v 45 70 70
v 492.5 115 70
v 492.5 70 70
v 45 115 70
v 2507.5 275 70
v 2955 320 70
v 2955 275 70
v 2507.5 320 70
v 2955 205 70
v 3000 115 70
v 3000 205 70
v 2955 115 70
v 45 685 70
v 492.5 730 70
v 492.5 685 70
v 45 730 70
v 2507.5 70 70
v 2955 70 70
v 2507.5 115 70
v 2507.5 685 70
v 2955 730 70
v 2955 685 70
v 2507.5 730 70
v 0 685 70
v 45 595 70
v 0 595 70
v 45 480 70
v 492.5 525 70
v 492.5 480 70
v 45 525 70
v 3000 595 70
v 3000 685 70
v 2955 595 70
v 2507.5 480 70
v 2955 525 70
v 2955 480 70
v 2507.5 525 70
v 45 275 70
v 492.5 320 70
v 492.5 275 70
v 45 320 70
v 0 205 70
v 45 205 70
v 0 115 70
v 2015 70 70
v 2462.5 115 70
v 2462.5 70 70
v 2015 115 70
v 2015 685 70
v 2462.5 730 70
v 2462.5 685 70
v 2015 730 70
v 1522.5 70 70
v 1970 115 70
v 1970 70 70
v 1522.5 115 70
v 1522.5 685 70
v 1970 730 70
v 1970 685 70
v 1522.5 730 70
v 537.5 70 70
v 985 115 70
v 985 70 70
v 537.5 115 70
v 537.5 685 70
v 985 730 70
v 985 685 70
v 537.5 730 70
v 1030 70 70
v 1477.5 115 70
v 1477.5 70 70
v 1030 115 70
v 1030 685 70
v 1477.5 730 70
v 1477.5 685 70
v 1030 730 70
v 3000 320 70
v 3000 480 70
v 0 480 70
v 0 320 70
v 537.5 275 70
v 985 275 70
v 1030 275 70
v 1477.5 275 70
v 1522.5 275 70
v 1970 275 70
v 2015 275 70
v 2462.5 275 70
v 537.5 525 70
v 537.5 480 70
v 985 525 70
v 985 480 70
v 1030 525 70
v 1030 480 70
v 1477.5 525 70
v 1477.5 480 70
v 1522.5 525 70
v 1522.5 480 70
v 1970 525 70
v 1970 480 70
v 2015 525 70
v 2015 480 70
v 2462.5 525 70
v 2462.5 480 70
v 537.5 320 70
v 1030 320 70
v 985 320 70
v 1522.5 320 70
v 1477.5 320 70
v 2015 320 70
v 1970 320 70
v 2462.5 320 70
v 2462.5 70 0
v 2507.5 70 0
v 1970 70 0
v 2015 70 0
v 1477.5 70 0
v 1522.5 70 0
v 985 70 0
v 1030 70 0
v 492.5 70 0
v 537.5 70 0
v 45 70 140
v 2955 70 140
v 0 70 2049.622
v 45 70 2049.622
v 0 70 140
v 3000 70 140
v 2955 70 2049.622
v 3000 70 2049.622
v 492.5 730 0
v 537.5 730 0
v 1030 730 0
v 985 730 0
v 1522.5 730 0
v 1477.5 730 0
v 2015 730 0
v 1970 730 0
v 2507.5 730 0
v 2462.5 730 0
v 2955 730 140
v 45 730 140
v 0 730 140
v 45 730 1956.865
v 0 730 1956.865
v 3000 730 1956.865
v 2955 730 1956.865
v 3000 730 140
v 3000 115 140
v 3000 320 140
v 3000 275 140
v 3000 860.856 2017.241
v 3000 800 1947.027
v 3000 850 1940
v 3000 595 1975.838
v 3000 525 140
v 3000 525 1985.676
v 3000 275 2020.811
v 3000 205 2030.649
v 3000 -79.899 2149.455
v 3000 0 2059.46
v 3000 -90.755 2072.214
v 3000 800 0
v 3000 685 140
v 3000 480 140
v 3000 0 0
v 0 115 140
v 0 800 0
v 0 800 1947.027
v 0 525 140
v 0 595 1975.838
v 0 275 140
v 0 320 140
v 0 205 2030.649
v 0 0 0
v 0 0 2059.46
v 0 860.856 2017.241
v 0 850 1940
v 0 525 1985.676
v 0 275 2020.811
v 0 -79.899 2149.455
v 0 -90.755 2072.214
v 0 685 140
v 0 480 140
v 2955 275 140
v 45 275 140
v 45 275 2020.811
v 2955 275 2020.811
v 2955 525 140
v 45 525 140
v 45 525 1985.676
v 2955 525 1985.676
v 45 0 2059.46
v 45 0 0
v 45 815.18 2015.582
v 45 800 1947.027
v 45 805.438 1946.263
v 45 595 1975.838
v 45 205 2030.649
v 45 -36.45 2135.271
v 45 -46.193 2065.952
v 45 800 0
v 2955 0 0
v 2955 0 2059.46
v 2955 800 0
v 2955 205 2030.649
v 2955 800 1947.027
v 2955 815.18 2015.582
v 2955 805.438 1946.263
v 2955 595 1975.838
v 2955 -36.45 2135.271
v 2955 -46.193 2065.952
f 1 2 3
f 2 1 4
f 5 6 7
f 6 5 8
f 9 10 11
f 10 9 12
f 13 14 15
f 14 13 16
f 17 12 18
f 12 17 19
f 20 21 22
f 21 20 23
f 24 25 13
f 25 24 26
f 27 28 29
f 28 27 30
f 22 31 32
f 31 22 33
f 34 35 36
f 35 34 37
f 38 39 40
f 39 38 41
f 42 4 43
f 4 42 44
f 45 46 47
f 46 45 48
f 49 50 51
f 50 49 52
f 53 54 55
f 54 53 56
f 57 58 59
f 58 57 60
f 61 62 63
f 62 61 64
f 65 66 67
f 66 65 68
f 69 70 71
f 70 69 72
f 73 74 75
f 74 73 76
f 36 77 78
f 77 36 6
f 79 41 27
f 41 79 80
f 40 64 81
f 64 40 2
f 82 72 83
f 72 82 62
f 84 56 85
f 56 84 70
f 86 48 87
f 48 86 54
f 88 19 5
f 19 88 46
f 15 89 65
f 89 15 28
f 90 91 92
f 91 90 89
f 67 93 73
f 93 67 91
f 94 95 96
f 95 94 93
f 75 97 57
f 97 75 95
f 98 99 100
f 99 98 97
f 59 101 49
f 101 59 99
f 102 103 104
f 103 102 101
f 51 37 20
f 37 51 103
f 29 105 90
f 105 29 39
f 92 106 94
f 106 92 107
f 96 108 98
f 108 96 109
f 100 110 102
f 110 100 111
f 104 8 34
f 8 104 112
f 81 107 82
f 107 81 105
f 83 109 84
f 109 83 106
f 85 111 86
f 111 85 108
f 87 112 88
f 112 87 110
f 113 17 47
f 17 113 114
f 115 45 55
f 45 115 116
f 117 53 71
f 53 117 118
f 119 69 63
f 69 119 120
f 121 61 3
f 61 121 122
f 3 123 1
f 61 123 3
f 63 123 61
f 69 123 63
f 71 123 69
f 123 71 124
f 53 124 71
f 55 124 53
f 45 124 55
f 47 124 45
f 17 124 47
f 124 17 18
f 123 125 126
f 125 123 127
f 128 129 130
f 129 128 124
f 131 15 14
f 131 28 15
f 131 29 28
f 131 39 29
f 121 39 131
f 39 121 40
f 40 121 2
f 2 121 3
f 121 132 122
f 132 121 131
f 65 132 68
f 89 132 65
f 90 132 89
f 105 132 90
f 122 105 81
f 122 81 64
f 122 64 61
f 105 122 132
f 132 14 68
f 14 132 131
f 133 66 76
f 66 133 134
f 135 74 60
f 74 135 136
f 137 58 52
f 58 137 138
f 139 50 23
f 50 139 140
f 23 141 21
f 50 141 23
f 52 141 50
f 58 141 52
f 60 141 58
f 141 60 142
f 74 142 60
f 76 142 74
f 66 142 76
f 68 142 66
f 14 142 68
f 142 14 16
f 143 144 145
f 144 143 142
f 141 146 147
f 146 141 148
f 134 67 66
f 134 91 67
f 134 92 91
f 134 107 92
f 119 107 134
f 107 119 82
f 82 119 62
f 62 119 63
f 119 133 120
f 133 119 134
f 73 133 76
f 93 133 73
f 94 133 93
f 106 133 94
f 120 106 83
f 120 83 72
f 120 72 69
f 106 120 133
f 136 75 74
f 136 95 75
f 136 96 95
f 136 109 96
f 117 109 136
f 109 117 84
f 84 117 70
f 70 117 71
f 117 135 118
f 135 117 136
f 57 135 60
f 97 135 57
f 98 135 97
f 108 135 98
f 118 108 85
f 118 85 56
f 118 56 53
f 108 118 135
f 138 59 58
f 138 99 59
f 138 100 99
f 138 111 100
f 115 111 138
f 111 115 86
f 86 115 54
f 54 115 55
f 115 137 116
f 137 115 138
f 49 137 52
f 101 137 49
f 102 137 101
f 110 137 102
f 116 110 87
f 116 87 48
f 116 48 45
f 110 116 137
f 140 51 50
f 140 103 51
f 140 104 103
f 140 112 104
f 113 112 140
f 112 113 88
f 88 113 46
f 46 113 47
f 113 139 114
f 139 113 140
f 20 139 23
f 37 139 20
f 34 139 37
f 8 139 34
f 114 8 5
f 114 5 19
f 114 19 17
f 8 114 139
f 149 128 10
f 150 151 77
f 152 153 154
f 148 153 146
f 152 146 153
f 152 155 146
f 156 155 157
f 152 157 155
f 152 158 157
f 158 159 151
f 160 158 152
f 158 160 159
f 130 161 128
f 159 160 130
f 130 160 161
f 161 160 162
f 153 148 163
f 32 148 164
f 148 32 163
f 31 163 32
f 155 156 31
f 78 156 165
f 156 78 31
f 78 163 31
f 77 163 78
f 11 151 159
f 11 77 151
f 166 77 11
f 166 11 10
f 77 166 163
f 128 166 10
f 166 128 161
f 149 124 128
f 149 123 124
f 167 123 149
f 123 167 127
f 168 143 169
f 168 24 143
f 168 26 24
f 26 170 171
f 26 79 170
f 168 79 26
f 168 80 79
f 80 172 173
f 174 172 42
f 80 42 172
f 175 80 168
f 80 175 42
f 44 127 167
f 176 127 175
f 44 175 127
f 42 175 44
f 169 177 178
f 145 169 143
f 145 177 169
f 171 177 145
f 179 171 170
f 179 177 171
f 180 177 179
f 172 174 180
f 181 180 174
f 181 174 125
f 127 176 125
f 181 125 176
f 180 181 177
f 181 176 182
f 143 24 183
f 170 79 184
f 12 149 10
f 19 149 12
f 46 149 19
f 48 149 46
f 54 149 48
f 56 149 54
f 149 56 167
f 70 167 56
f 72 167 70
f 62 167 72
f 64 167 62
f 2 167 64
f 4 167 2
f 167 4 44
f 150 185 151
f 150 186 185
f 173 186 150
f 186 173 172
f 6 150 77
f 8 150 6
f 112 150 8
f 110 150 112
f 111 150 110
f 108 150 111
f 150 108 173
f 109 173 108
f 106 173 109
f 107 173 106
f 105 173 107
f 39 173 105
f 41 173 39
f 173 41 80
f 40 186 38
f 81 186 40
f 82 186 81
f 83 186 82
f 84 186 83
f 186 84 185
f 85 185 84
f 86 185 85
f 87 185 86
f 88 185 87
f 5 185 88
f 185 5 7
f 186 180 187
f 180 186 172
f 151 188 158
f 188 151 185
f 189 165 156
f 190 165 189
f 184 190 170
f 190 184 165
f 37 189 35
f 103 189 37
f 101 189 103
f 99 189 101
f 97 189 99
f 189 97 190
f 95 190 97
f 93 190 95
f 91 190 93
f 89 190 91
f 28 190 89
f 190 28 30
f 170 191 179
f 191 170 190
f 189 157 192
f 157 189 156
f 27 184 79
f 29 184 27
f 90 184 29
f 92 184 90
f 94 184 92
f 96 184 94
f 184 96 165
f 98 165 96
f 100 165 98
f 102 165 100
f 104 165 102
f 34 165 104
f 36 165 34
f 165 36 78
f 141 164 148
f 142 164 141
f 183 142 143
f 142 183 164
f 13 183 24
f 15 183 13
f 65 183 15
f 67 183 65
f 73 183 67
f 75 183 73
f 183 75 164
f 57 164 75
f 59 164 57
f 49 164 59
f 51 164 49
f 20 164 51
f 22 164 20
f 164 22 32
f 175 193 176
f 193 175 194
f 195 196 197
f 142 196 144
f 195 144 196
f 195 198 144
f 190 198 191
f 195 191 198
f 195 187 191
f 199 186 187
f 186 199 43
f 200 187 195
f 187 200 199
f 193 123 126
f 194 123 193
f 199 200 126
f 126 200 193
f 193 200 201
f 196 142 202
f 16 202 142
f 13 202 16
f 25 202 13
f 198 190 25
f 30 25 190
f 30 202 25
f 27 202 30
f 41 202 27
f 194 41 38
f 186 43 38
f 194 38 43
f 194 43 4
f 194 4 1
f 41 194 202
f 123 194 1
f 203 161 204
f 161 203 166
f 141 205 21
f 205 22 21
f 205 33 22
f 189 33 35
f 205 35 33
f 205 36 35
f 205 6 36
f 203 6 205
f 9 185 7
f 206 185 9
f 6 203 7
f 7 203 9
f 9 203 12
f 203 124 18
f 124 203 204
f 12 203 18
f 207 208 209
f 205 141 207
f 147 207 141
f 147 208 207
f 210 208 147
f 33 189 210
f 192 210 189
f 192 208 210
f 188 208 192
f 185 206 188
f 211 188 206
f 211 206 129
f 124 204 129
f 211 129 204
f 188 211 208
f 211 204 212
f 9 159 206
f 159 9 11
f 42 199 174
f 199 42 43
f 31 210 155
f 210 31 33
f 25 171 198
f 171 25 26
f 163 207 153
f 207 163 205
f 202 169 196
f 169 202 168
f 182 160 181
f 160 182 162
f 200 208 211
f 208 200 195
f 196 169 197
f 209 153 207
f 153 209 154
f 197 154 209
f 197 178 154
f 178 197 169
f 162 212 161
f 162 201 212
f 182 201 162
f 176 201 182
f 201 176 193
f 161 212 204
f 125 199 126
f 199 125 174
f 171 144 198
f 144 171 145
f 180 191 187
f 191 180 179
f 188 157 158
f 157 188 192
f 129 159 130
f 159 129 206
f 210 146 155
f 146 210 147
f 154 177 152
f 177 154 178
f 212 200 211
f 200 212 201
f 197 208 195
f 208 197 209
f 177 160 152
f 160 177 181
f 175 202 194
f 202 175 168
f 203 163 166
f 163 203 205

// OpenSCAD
x = 0;
y = 1;
z = 2;

w = 3000;
d = 800;
h = 2000-100;

hranol = [0, 45, 70];

// krajní podložky
translate([hranol[1], 0, 0])
    pricka(d);
translate([w - hranol[1] + hranol[1], 0, 0])
    pricka(d);

// prostřední podložky
for (i = [(w - hranol[1]) / 6:(w - hranol[1]) / 6:w - 4 * hranol[1]]) {
    translate([i + hranol[1], hranol[z], 0])
        pricka(d - 2 * hranol[z]);
}

// podlaha
translate([0, hranol[z], hranol[z]])
    for (i = [0:(d - hranol[y] - 2 * hranol[z]) / 3:d - hranol[y]]) {
        translate([0, i, 0])
            hranol(w);
    }

// sloupky
translate([0, 0, hranol[z]]) {

    sloupek(h + 100);
    translate([w - hranol[y], 0, 0]) sloupek(h + 100);

    translate([w - hranol[y], (d - hranol[y] - 2 * hranol[z]) / 3, 0]) sloupek(h + 70);
    translate([0, (d - hranol[y] - 2 * hranol[z]) / 3, 0]) sloupek(h + 70);

    translate([w - hranol[y], d - (d - hranol[y] - 2 * hranol[z]) / 3 - hranol[z], 0]) sloupek(h + 30);
    translate([0, d - (d - hranol[y] - 2 * hranol[z]) / 3 - hranol[z], 0]) sloupek(h + 30);

    translate([w - hranol[y], d - hranol[z], 0]) sloupek(h);
    translate([0, d - hranol[z], 0]) sloupek(h);

}

// střecha
translate([0, d + 50, h + hranol[z] - 30])
    rotate([- 8, 0, 0]) {
        rotate([0, 0, - 90])
            hranol(d + 150);
        translate([w - hranol[y], 0, 0])
            rotate([0, 0, - 90])
                hranol(d + 150);
        translate([hranol[y], - d - 150, 0])
            hranol(w - 2 * hranol[y]);
        translate([hranol[y], - hranol[y], 0])
            hranol(w - 2 * hranol[y]);
        translate([0, - d - 150, hranol[z]]) osb([w, d + 150]);

    }

module pricka(d) {
    rotate([0, 0, 90])
        hranol(d);
}

module sloupek(l) {
    rotate([- 90, - 90, 0])
        hranol(l);
}

module hranol(l) {
    cube(hranol + [l, 0, 0]);
    echo("hranol", l);
}

module osb(s) {
    cube([s[0], s[1], 8]);
    echo("osb", s);
}
